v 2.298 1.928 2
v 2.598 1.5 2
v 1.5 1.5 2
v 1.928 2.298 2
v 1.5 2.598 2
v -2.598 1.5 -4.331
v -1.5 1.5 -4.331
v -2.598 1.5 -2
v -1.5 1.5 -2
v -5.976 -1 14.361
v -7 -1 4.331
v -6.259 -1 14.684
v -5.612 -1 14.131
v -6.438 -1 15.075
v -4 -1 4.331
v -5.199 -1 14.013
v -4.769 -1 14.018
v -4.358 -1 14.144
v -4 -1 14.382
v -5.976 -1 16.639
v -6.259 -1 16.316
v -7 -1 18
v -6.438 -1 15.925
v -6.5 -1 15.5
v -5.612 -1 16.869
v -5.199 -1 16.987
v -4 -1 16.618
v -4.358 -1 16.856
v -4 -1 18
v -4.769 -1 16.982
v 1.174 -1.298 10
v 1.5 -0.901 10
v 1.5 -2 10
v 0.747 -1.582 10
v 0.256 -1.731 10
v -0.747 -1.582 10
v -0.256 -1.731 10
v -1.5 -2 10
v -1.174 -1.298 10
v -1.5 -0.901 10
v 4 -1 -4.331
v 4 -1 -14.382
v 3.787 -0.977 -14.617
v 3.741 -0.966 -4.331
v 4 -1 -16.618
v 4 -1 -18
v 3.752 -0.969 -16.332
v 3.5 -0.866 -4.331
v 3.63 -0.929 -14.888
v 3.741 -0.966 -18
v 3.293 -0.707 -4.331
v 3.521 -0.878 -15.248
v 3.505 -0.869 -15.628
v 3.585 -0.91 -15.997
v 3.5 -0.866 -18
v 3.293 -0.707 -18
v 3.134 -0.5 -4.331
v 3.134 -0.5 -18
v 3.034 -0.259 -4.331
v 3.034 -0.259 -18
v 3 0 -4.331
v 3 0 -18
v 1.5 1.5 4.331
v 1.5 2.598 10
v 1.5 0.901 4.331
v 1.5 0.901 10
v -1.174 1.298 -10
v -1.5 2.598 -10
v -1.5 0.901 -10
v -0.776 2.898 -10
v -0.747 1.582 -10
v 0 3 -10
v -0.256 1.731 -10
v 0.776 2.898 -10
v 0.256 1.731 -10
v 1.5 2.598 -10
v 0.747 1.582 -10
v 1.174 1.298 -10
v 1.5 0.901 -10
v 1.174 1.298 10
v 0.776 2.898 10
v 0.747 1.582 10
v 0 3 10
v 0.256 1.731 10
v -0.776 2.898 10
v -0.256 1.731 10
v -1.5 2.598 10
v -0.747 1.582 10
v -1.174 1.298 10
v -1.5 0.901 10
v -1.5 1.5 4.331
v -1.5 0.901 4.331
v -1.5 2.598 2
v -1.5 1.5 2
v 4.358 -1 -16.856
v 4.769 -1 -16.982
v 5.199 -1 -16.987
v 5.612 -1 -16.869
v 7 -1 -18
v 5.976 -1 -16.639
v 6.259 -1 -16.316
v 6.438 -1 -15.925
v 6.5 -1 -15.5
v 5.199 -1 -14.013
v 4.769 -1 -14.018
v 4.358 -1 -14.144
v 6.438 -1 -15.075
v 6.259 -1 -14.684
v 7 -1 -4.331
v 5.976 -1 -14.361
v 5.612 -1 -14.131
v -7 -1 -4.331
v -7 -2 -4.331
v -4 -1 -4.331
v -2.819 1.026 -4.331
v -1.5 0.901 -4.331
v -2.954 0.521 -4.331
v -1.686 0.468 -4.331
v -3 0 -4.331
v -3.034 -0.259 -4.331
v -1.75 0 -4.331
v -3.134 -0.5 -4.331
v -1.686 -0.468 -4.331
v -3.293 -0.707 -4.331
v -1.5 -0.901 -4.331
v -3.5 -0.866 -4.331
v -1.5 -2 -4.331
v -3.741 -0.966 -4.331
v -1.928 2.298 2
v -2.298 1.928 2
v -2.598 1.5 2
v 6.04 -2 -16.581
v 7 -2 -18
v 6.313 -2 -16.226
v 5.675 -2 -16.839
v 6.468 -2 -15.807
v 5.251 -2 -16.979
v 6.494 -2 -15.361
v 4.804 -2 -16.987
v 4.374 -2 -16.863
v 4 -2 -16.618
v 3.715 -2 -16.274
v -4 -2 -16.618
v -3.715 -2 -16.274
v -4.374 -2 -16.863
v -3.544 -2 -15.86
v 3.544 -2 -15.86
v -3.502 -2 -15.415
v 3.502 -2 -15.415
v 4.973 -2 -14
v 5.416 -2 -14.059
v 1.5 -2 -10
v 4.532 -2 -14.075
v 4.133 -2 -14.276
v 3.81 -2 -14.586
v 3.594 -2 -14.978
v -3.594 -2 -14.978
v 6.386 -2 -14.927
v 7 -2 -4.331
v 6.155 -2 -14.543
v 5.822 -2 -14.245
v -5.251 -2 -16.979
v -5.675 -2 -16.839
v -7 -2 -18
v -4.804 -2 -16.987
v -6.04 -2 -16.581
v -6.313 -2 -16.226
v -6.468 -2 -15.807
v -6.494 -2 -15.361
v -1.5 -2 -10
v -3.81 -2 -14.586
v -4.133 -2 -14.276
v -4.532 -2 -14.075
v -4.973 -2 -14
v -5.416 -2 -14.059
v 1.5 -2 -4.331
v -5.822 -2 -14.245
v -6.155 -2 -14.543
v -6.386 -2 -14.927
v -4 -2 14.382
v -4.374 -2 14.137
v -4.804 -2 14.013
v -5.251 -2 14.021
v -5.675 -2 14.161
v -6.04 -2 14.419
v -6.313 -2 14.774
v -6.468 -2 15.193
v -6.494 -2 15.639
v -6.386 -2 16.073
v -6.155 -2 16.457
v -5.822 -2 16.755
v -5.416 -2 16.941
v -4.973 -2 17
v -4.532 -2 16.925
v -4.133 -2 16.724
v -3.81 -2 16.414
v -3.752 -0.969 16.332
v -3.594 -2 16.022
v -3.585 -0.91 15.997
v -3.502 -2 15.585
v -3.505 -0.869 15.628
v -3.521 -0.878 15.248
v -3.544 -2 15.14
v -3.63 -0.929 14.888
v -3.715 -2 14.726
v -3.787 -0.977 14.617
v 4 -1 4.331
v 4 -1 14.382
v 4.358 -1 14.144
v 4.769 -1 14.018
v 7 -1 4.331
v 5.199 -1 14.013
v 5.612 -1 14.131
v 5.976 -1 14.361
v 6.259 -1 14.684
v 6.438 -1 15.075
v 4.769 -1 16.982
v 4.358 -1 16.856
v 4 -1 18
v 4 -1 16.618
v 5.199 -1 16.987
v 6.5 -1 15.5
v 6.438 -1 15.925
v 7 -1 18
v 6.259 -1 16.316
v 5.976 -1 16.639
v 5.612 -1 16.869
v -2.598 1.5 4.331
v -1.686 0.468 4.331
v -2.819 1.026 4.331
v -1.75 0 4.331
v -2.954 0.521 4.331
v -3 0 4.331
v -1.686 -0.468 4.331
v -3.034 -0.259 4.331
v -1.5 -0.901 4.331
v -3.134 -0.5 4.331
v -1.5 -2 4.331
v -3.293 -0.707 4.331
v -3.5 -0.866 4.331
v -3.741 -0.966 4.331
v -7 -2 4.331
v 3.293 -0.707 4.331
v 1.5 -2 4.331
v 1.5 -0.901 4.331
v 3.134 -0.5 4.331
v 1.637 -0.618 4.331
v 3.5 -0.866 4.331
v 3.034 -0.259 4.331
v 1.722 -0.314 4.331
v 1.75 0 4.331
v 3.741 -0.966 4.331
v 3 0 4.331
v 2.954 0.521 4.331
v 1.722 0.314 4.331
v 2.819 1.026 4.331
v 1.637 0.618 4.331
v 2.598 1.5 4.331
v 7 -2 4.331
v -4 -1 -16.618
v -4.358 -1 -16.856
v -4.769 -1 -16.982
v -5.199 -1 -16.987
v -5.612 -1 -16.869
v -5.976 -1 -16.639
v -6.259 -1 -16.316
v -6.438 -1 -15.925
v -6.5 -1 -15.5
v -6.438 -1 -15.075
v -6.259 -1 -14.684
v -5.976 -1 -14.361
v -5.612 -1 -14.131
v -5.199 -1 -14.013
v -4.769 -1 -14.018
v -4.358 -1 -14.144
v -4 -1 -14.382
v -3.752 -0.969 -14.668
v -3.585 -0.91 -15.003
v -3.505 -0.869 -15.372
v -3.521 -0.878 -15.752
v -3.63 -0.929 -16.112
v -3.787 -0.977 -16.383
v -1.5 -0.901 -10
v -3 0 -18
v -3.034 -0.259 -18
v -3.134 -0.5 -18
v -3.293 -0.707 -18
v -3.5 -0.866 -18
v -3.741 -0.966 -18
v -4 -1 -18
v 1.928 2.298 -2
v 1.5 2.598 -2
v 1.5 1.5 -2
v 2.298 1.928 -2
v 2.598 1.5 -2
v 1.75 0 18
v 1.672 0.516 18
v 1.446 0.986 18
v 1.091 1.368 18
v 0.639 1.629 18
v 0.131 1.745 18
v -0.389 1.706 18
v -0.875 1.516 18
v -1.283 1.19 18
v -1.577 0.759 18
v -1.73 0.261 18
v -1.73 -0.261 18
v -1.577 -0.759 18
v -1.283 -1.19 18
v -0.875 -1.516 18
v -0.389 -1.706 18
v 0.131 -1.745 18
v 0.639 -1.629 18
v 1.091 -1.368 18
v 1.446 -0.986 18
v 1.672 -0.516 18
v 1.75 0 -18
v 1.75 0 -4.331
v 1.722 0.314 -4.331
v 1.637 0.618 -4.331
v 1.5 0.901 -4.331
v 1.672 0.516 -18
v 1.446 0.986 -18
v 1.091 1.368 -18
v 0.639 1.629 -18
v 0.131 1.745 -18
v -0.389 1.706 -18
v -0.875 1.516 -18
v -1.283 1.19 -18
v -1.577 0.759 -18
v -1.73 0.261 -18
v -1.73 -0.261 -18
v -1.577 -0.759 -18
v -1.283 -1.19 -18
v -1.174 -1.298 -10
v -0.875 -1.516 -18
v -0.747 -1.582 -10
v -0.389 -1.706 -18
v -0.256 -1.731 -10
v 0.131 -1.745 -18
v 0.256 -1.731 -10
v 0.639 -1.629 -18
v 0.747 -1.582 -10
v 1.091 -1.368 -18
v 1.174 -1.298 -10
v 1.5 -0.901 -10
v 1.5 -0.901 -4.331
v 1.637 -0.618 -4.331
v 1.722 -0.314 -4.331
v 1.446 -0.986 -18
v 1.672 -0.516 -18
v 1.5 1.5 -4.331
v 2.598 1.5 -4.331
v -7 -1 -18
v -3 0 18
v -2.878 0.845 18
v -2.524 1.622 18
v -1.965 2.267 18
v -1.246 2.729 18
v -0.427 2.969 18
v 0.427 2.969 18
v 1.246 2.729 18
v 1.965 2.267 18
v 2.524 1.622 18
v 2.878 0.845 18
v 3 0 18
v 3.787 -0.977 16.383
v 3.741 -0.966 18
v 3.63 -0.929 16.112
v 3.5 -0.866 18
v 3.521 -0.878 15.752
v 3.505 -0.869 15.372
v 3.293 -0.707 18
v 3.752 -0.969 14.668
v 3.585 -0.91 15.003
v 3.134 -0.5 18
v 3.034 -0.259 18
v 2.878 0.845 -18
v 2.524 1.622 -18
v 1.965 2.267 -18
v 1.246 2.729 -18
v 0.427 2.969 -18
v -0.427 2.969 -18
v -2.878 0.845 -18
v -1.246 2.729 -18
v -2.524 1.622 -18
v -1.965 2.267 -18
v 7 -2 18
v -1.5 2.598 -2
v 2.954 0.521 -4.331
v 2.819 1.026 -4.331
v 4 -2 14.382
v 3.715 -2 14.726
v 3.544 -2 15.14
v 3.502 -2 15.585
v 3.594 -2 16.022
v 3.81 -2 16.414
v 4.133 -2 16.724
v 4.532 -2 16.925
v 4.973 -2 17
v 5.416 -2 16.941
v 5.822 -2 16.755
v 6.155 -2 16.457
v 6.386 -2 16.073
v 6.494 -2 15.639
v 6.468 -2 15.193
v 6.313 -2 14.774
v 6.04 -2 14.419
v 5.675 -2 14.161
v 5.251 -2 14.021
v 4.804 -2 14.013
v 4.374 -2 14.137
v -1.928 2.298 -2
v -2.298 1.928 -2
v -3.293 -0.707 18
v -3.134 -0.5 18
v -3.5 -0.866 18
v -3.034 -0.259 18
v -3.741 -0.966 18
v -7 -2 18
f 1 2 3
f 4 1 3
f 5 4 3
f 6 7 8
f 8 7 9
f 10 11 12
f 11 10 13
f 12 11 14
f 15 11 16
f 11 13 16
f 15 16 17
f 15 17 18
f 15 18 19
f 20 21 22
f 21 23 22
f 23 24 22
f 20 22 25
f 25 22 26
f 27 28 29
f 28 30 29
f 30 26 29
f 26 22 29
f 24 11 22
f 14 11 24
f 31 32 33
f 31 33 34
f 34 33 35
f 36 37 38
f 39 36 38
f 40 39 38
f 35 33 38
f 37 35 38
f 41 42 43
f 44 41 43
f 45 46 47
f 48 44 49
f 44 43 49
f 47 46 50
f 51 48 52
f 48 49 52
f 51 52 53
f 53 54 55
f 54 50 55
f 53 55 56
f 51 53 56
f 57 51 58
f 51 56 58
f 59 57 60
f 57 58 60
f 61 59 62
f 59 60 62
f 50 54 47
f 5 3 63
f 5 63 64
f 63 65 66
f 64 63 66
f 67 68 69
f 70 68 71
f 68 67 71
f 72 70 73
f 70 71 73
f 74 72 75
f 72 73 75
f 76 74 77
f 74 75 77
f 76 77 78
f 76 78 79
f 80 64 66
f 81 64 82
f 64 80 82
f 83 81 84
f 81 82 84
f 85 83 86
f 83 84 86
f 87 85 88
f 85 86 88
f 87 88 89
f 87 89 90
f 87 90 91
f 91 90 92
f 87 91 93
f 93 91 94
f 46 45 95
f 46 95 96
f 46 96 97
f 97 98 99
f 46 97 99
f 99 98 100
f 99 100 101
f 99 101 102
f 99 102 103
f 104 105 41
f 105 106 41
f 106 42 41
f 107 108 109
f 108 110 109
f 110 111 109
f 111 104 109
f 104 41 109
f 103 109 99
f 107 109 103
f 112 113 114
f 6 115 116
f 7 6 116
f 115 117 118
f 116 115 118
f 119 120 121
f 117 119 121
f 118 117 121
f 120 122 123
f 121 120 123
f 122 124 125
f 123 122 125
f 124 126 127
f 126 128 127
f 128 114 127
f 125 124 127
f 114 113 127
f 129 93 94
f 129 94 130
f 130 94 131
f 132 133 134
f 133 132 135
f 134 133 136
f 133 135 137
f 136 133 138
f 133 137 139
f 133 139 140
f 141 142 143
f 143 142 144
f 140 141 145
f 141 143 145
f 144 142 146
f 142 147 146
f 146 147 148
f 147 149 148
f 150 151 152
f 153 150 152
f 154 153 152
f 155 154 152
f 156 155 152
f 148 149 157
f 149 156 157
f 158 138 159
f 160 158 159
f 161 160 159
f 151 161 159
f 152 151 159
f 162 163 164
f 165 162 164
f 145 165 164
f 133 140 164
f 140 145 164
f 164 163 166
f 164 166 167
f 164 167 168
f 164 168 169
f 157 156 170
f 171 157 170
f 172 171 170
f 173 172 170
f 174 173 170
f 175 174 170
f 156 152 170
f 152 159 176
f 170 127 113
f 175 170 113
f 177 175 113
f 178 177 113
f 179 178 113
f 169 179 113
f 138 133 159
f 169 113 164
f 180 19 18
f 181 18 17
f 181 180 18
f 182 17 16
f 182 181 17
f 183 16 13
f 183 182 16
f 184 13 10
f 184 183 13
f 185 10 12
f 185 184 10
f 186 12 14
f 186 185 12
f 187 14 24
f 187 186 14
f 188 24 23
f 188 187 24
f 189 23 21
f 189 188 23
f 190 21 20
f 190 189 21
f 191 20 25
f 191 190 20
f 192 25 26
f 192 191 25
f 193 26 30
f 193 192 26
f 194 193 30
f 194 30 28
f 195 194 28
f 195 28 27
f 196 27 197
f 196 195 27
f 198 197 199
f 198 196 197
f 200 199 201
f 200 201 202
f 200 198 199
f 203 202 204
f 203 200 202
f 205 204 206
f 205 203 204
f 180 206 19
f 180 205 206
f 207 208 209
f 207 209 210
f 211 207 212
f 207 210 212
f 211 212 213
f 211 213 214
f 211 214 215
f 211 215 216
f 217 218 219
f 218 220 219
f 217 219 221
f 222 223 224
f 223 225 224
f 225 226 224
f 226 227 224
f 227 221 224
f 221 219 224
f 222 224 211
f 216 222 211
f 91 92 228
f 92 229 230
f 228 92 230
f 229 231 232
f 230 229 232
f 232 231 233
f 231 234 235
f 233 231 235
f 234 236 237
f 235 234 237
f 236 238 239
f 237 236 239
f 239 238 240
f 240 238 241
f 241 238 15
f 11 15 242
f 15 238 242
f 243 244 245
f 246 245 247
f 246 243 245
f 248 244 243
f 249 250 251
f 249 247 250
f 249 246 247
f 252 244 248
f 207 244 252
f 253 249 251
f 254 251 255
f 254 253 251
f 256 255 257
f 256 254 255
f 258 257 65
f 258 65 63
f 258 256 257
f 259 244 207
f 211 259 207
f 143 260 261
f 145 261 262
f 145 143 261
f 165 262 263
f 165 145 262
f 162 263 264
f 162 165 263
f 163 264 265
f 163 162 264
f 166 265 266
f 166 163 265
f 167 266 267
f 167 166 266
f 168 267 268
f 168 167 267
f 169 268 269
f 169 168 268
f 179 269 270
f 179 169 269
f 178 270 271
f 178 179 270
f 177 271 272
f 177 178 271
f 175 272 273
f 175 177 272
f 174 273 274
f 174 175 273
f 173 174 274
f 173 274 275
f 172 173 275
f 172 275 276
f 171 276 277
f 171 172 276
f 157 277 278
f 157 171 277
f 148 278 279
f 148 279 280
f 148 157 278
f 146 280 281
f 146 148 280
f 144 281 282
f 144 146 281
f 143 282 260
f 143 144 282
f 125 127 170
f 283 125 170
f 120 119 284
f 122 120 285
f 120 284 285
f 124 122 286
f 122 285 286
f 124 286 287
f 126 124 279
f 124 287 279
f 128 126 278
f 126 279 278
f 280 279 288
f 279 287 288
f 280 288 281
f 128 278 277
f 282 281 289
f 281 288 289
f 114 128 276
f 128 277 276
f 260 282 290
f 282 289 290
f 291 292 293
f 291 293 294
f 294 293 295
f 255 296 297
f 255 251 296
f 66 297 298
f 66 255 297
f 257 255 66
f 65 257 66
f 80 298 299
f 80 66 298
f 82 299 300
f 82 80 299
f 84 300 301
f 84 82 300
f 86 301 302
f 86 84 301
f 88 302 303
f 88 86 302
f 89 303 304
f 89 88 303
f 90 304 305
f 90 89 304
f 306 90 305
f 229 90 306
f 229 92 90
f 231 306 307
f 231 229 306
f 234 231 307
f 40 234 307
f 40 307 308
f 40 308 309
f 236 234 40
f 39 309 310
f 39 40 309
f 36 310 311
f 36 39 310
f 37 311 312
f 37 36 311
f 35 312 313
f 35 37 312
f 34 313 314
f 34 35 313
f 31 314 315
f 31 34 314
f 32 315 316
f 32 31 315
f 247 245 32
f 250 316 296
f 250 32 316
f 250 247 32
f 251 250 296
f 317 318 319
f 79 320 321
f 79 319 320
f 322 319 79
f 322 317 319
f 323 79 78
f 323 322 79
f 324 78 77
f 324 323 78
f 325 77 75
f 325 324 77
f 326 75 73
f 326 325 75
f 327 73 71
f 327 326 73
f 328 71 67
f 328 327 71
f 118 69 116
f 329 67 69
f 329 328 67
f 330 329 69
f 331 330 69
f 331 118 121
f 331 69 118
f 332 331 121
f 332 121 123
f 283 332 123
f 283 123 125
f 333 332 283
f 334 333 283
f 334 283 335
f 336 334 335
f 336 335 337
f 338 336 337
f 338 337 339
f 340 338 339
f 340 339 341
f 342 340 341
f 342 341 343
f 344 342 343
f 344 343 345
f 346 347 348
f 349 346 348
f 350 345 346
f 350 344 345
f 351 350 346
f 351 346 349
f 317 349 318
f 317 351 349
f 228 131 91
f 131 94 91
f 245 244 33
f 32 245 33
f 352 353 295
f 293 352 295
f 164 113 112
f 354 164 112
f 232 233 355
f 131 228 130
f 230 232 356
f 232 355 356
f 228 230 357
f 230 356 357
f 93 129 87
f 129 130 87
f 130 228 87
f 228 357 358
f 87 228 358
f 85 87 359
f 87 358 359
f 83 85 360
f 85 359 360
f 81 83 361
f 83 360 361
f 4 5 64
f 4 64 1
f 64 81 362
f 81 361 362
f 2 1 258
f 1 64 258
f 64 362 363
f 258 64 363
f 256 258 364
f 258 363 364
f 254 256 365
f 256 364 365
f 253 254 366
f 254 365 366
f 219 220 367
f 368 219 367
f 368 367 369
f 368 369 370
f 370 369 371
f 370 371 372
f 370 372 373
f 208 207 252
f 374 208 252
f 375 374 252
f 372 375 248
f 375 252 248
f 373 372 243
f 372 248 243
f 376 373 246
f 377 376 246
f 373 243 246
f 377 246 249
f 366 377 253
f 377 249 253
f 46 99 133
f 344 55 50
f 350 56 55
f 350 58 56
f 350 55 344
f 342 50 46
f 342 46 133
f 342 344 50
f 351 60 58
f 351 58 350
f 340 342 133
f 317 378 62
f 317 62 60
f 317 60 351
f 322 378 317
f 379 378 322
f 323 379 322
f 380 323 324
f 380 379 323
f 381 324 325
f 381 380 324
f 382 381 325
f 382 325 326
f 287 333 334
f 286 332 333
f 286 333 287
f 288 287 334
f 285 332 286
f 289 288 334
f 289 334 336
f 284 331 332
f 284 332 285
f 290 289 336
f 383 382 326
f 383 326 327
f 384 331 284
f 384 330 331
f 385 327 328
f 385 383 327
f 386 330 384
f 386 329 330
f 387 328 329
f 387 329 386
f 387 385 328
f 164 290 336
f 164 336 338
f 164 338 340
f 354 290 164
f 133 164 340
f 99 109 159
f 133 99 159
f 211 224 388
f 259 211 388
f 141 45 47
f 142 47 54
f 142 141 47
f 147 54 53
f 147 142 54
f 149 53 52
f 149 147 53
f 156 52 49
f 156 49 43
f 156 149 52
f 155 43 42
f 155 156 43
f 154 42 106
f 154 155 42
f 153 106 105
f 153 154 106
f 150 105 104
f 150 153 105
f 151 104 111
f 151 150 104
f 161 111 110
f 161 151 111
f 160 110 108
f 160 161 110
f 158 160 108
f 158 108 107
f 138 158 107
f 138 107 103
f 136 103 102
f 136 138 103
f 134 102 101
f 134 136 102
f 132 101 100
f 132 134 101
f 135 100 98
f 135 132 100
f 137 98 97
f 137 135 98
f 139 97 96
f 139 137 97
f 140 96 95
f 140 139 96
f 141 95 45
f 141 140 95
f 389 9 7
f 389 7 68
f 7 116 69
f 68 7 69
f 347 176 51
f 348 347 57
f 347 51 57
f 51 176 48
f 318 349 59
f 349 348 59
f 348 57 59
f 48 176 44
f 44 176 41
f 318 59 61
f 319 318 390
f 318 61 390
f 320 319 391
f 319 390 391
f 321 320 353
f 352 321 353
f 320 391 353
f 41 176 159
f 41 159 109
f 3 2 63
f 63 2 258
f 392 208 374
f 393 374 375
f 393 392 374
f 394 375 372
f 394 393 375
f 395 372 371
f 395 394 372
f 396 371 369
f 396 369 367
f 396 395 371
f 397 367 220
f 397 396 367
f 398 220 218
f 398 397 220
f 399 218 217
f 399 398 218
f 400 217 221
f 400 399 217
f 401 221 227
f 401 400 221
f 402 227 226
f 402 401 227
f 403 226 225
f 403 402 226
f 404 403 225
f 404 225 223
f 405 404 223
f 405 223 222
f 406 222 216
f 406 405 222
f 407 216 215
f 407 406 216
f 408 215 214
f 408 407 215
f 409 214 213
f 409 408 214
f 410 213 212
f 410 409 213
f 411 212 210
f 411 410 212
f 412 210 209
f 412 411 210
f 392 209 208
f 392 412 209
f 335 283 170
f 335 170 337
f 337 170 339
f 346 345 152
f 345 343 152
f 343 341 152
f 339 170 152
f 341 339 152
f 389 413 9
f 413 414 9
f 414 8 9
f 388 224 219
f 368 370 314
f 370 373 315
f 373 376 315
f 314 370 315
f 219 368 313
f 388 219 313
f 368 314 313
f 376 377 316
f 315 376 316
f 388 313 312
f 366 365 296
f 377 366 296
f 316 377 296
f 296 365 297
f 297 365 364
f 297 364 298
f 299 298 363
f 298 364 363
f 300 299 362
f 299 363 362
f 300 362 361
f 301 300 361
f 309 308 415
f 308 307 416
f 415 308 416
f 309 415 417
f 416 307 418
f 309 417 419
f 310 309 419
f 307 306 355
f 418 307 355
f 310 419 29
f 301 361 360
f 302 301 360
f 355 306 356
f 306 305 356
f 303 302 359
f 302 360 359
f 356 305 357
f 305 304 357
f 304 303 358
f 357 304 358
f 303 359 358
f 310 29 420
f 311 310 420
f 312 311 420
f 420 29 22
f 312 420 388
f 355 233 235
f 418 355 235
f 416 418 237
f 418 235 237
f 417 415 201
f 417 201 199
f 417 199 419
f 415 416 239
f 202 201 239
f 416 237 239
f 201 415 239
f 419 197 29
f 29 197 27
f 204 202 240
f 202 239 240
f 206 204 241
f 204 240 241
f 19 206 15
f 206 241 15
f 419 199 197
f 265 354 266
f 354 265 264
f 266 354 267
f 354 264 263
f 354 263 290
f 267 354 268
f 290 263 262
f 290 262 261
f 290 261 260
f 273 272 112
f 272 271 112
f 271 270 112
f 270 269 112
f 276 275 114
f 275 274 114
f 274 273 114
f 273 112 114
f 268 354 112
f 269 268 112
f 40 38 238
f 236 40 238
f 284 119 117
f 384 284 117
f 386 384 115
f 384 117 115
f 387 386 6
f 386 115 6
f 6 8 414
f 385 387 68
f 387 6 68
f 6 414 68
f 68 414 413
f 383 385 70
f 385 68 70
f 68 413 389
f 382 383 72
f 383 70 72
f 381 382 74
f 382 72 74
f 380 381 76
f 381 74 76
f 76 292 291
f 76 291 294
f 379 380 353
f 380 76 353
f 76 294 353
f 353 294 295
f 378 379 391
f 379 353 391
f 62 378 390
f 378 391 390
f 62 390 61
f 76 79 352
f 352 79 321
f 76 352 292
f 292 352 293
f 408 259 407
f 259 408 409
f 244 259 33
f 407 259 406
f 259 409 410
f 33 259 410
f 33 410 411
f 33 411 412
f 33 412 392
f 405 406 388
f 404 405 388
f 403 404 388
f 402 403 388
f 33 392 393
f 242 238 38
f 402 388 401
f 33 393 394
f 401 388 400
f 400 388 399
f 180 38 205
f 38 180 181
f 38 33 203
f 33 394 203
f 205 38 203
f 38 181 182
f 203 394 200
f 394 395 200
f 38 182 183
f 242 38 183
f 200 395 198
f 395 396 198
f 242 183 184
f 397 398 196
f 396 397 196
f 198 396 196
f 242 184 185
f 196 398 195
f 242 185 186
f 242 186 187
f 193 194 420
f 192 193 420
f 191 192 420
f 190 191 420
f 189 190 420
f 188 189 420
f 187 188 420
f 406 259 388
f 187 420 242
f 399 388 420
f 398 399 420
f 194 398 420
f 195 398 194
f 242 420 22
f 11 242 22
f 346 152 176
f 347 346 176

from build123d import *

# Parameters (mm, degrees)
IZIM1_R                     = 1.75
Y_KSEKLIK_EKSTR_ZYON1_DEPTH = 18
RADYUS1_R                   = 1
KES_EKSTR_ZYON3_DEPTH       = 11
KES_EKSTR_ZYON3_DEPTH_BACK  = 10
IZIM3_R                     = 1.5
KES_EKSTR_ZYON4_DEPTH       = 10
KES_EKSTR_ZYON5_DEPTH       = 13
KES_EKSTR_ZYON5_DEPTH_BACK  = 11
IZIM6_W                     = 8.662812744
IZIM6_H                     = 3.5


with BuildPart() as part:
    # Çizim1 → Yükseklik-Ekstrüzyon1 (new, symmetric)
    with BuildSketch(Plane.XY):
        with BuildLine():
            Line((-7, -2), (-7, -1))
            Line((-7, -1), (-2.828427125, -1))
            ThreePointArc((-2.828427125, -1), (0, 3), (2.828427125, -1))
            Line((2.828427125, -1), (7, -1))
            Line((7, -1), (7, -2))
            Line((7, -2), (-7, -2))
        make_face()
        Circle(IZIM1_R, mode=Mode.SUBTRACT)
    extrude(amount=Y_KSEKLIK_EKSTR_ZYON1_DEPTH, both=True)

    # Radyus1
    radyus1_edges = [part.edges().sort_by_distance(p)[0] for p in [
        (2.828427125, -1, 0),
        (-2.828427125, -1, 0),
    ]]
    fillet(radyus1_edges, radius=RADYUS1_R)

    # Çizim3 → Kes-Ekstrüzyon3 (cut, two sides: drawn at the far end of the back side and taken through both)
    with BuildSketch(Plane(origin=(0, -1, 0), x_dir=(1, 0, 0), z_dir=(0, 1, 0)).offset(-KES_EKSTR_ZYON3_DEPTH_BACK)):
        with Locations(Location((-5, -15.5, 0), (0, 0, 48.189685104))):
            Circle(IZIM3_R)
        with Locations(Location((5, -15.5, 0), (0, 0, 131.810314896))):
            Circle(IZIM3_R)
        with Locations(Location((5, 15.5, 0), (0, 0, 131.810314896))):
            Circle(IZIM3_R)
        with Locations(Location((-5, 15.5, 0), (0, 0, 48.189685104))):
            Circle(IZIM3_R)
    extrude(amount=KES_EKSTR_ZYON3_DEPTH + KES_EKSTR_ZYON3_DEPTH_BACK, mode=Mode.SUBTRACT)

    # Çizim5 → Kes-Ekstrüzyon4 (cut)
    with BuildSketch(Plane.XZ.offset(2)):
        Polygon((-1.5, -10), (0, -10), (0, 10), (-1.5, 10), (-1.5, 2), (-3.5, 2), (-3.5, 4.331406372), (-7, 4.331406372), (-7, -4.331406372), (-3.5, -4.331406372), (-3.5, -2), (-1.5, -2), align=None)
        Polygon((0, 10), (0, -10), (1.5, -10), (1.5, -2), (3.5, -2), (3.5, -4.331406372), (7, -4.331406372), (7, 4.331406372), (3.5, 4.331406372), (3.5, 2), (1.5, 2), (1.5, 10), align=None)
    extrude(amount=-KES_EKSTR_ZYON4_DEPTH, mode=Mode.SUBTRACT)


with BuildPart() as kes_ekstr_zyon4_piece_1:
    # of the separate pieces the step leaves, piece 1, a body of its own (kes_ekstr_zyon4_pieces)
    add(part.part.solids().sort_by_distance((-4, -1, -18))[0])


with BuildPart() as kes_ekstr_zyon4_piece_2:
    # of the separate pieces the step leaves, piece 2, a body of its own (kes_ekstr_zyon4_pieces)
    add(part.part.solids().sort_by_distance((-4, -1, 18))[0])


with BuildPart() as kes_ekstr_zyon5_tool:
    # Çizim6 → Kes-Ekstrüzyon5 (new, two sides: drawn at the far end of the back side and taken through both)
    with BuildSketch(Plane.ZY.offset(3.5).offset(-KES_EKSTR_ZYON5_DEPTH_BACK)):
        with Locations((0, -0.25)):
            Rectangle(IZIM6_W, IZIM6_H)
    extrude(amount=KES_EKSTR_ZYON5_DEPTH + KES_EKSTR_ZYON5_DEPTH_BACK)


with BuildPart() as kes_ekstr_zyon4_piece_1_1:
    add(kes_ekstr_zyon4_piece_1.part)

    # Kes-Ekstrüzyon5: cut by kes_ekstr_zyon5_tool
    add(kes_ekstr_zyon5_tool.part, mode=Mode.SUBTRACT)


with BuildPart() as kes_ekstr_zyon4_piece_2_1:
    add(kes_ekstr_zyon4_piece_2.part)

    # Kes-Ekstrüzyon5: cut by kes_ekstr_zyon5_tool
    add(kes_ekstr_zyon5_tool.part, mode=Mode.SUBTRACT)


solid = Compound([kes_ekstr_zyon4_piece_1_1.part, kes_ekstr_zyon4_piece_2_1.part])
